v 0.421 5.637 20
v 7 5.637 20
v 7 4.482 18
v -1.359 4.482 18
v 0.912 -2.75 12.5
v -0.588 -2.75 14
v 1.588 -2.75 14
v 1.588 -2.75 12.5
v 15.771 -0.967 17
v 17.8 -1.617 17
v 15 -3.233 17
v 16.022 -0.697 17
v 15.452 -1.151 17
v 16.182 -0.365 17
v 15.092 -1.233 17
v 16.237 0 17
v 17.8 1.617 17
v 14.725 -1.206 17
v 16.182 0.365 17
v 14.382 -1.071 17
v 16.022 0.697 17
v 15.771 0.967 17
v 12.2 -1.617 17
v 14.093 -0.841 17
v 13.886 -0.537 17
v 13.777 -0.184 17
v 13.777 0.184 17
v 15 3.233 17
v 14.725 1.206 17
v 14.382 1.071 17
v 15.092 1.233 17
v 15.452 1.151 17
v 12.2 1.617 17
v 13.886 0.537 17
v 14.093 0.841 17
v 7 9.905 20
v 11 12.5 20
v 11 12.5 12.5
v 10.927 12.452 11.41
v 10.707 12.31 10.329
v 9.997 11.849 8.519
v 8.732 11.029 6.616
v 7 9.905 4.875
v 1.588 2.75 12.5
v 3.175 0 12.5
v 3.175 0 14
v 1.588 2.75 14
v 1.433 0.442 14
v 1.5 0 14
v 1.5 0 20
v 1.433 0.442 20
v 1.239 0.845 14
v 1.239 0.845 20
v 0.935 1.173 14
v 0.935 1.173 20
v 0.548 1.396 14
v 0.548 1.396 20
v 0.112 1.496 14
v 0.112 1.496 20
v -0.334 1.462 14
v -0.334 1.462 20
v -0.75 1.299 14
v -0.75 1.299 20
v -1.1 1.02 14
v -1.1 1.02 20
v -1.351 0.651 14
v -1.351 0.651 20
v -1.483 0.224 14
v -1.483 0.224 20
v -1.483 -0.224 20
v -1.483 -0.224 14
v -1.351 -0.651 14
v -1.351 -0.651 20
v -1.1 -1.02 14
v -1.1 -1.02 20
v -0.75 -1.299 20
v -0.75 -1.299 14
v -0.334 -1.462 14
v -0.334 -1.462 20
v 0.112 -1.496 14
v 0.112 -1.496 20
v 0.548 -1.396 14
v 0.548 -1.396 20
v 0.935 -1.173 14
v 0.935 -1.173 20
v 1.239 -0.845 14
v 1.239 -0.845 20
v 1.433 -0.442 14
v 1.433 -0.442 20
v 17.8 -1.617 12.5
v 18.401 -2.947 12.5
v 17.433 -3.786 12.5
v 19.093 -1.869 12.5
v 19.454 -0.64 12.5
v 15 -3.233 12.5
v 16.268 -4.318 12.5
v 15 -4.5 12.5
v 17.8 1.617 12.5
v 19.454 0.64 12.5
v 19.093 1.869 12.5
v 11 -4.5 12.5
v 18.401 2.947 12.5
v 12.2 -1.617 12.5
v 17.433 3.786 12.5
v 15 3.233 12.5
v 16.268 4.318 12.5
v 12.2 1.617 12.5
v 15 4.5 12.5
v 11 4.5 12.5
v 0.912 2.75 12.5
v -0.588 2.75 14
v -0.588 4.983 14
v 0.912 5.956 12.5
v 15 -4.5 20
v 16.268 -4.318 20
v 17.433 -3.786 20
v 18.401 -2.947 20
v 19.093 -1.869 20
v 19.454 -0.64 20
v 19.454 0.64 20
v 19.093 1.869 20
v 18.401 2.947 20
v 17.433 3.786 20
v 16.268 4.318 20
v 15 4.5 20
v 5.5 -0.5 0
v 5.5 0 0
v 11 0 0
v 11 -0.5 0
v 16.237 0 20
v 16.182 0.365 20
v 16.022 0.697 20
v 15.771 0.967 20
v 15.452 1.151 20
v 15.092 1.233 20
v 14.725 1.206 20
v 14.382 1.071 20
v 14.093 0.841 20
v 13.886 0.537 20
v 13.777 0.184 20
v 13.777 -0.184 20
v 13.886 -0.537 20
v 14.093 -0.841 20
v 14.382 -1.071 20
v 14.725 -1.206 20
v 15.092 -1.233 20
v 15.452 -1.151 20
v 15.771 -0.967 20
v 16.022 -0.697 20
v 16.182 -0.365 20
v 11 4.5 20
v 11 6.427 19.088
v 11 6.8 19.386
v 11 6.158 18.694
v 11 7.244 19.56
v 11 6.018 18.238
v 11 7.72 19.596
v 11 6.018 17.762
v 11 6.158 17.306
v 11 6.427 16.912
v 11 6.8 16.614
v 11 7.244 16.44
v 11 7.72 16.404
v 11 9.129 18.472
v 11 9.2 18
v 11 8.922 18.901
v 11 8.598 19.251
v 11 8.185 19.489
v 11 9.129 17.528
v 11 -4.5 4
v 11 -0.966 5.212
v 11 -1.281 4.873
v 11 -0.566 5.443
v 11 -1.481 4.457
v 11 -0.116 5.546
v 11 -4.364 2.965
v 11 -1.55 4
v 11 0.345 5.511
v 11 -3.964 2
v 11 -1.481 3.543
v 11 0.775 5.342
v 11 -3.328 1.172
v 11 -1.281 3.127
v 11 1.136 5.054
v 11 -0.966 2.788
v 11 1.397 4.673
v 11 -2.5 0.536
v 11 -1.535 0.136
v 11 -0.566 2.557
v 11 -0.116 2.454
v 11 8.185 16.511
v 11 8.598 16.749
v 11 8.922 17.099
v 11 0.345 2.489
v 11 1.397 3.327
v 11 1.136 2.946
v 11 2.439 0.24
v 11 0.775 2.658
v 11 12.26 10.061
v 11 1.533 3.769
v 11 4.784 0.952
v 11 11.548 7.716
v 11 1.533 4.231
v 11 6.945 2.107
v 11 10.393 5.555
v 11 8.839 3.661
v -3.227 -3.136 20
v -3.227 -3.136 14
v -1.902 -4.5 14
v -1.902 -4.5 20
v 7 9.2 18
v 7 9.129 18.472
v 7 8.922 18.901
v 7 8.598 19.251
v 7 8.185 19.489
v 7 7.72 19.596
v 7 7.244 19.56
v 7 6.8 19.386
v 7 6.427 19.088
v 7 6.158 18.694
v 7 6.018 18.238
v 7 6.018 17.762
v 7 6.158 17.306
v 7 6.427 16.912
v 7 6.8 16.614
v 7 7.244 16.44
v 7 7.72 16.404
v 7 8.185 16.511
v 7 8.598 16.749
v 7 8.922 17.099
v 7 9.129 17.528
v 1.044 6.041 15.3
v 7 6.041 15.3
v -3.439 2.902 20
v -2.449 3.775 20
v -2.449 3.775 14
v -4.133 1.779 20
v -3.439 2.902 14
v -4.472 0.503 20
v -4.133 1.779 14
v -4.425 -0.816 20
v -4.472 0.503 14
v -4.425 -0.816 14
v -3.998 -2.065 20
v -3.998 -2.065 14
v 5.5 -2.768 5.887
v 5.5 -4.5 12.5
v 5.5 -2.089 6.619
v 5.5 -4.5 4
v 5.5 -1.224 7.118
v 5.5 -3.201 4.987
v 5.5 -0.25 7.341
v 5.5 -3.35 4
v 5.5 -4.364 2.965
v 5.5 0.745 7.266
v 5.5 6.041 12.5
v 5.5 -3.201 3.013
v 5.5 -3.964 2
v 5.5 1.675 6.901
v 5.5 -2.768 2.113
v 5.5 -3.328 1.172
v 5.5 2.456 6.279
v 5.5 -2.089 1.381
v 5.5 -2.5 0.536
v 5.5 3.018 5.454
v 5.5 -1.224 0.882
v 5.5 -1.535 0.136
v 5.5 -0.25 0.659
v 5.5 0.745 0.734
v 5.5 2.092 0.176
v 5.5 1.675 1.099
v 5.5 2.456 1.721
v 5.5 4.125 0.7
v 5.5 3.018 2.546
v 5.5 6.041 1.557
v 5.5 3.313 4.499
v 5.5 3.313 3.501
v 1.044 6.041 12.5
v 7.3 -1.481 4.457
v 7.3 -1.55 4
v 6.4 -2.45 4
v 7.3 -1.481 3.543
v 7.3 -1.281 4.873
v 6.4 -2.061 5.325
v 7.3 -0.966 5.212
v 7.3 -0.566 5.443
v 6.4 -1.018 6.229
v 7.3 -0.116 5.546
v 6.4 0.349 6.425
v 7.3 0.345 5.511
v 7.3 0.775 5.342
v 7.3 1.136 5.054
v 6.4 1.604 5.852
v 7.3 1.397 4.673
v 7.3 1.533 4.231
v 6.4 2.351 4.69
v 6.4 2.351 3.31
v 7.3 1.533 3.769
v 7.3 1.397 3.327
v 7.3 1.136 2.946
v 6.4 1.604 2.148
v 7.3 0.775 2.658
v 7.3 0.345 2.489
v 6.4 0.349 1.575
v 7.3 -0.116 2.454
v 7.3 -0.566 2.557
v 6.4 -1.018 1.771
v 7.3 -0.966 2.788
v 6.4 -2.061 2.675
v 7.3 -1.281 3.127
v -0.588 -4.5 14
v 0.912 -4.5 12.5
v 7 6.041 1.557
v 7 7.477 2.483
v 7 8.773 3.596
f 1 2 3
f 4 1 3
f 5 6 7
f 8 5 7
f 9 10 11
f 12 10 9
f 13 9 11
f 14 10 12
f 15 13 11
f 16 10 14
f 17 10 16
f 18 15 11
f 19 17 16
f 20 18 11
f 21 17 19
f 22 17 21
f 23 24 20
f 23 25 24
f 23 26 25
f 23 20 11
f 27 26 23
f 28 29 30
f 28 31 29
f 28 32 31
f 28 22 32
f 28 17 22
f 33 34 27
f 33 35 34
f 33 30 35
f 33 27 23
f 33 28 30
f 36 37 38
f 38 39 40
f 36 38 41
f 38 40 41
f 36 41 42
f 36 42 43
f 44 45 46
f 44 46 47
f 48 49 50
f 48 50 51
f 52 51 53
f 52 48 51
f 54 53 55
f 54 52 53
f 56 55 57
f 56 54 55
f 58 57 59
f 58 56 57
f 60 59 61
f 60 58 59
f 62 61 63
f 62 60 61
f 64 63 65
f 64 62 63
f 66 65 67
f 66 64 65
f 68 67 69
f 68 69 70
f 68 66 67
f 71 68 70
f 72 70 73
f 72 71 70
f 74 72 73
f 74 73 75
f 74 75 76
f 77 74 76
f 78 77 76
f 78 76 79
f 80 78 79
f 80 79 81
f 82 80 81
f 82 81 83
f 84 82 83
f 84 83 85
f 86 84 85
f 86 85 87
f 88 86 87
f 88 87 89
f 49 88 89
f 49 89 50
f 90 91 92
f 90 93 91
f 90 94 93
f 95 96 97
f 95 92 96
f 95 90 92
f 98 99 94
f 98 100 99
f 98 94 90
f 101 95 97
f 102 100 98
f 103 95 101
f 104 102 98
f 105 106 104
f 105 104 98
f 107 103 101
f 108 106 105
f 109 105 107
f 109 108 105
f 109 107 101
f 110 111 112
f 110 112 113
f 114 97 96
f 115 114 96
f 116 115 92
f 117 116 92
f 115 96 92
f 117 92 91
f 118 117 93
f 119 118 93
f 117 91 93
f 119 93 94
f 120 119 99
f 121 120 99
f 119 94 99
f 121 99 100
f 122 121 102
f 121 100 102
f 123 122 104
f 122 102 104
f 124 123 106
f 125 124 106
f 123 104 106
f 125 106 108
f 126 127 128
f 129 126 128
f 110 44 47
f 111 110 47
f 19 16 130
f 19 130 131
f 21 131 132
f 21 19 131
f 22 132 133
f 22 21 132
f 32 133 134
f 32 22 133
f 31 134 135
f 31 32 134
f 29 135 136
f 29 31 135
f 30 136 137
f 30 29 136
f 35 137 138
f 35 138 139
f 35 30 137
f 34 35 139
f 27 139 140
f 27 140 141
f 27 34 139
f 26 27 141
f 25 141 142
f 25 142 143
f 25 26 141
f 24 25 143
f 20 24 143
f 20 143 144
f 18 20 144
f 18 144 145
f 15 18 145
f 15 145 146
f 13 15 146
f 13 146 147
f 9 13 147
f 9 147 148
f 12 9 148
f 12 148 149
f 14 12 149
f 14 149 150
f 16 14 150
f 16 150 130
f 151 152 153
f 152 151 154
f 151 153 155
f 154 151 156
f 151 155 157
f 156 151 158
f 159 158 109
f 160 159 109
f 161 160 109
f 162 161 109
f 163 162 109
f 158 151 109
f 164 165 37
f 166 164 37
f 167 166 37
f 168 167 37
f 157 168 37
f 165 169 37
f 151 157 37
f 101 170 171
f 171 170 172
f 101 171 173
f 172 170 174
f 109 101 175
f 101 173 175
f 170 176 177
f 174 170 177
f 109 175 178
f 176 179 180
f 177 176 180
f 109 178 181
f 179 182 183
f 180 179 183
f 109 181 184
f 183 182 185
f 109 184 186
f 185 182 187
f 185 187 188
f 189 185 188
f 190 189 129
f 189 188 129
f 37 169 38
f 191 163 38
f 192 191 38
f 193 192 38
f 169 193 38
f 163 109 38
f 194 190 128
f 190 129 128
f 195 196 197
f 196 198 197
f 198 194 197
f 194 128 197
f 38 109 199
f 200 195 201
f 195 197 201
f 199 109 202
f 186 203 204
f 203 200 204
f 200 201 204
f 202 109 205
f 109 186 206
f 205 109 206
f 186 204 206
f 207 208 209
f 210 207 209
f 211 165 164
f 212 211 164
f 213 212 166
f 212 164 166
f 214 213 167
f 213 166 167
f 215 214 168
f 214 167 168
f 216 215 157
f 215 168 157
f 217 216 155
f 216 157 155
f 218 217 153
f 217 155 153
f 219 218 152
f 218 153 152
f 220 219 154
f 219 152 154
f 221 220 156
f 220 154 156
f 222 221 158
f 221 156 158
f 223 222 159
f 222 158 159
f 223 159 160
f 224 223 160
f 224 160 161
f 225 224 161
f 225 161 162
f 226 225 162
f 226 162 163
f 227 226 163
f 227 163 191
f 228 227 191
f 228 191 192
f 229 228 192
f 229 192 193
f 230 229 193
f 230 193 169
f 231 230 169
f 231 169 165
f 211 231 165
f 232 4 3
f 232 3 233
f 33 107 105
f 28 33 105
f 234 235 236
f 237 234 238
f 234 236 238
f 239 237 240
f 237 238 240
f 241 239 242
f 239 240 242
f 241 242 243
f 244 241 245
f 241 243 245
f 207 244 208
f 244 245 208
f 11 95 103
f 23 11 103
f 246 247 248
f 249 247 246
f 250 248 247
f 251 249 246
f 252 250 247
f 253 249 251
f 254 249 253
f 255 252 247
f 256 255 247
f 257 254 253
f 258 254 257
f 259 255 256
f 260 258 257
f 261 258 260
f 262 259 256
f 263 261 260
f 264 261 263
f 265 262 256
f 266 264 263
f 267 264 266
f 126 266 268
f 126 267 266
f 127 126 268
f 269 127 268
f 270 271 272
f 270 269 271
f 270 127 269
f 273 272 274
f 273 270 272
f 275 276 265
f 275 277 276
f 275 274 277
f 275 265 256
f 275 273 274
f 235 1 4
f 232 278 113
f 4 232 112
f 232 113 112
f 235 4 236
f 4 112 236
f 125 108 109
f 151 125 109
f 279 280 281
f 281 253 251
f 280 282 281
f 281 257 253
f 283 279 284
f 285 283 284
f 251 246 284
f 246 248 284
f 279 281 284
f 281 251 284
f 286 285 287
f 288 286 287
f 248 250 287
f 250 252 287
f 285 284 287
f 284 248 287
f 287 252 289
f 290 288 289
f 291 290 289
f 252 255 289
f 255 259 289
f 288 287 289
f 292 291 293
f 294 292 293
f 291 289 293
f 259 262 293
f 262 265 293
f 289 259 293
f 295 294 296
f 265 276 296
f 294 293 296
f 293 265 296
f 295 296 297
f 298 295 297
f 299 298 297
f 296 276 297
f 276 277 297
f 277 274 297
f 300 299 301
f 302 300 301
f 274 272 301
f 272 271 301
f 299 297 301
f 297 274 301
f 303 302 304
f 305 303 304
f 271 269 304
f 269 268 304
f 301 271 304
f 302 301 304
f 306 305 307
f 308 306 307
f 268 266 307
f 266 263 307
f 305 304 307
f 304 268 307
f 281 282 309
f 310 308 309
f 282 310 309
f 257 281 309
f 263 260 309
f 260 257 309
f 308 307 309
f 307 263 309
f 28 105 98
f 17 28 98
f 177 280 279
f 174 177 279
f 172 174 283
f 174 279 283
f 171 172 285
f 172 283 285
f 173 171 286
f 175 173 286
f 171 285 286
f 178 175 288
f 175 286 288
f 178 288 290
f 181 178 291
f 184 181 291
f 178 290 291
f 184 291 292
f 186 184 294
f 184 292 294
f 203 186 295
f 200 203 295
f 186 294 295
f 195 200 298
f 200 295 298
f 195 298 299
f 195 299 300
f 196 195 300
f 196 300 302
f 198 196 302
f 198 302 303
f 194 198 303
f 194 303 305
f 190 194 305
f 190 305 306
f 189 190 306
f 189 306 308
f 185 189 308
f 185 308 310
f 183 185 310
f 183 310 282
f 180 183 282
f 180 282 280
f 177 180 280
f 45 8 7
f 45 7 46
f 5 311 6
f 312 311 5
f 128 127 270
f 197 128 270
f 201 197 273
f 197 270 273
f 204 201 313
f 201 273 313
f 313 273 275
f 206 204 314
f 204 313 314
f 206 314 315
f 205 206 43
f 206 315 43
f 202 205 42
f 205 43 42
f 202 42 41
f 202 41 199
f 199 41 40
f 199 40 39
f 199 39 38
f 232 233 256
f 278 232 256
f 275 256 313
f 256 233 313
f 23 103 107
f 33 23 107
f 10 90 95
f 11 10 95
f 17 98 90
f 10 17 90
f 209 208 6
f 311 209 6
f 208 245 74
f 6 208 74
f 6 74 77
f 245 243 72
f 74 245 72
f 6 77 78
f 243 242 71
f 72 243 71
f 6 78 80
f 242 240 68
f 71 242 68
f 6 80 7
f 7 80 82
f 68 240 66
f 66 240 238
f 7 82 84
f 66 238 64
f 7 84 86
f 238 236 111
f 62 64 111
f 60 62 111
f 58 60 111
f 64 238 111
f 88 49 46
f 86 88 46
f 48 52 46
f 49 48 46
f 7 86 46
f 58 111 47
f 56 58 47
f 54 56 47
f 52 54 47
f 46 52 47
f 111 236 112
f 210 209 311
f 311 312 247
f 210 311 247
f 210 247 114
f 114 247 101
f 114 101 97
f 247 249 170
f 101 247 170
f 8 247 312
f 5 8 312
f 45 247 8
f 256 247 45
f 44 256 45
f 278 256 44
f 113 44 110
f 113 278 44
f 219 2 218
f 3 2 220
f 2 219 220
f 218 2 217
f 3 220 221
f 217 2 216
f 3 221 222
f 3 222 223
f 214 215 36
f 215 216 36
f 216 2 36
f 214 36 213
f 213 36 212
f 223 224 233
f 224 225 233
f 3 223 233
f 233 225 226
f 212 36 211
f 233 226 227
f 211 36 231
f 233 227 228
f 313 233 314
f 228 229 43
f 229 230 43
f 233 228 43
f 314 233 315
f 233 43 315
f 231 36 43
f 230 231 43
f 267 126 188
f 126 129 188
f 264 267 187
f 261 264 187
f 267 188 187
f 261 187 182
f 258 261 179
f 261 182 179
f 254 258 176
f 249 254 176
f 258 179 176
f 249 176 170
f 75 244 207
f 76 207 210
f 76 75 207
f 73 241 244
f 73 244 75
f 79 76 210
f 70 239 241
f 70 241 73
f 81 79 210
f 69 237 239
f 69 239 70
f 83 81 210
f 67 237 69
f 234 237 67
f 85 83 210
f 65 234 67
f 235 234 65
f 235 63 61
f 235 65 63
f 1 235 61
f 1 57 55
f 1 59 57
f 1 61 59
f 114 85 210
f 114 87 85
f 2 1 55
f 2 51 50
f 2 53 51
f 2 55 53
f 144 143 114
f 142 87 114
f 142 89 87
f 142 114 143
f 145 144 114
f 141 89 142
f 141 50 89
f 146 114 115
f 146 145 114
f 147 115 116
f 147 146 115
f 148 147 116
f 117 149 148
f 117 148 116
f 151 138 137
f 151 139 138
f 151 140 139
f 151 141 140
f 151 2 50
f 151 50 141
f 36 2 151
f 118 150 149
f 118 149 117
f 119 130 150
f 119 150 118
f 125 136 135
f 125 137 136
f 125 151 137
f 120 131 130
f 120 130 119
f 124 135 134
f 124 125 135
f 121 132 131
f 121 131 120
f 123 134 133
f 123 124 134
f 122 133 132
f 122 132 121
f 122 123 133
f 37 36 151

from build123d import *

# Parameters (mm, degrees)
SKETCH1_R           = 1.5
SKETCH1_R_2         = 1.236773622
BOSS_EXTRUDE1_DEPTH = 20
SKETCH3_R           = 1.6
CUT_EXTRUDE3_DEPTH  = 29.222331583
CUT_EXTRUDE4_DEPTH  = 14
CUT_EXTRUDE5_START  = -4
CUT_EXTRUDE5_DEPTH  = 25.222331583
SKETCH6_W           = 8.5
SKETCH6_H           = 9
SKETCH6_W_2         = 10
SKETCH6_H_2         = 10.541154273
CUT_EXTRUDE6_DEPTH  = 12.5
CHAMFER2_SIZE       = 2.5
CUT_EXTRUDE7_DEPTH  = 4.5
SKETCH8_R           = 1.55
CUT_EXTRUDE8_DEPTH  = 28.427176304
FILLET1_R           = 4
CHAMFER4_SIZE       = 1.8


with BuildPart() as part:
    # Sketch1 → Boss-Extrude1 (new body)
    with BuildSketch(Plane.XY):
        with BuildLine():
            Line((11, 12.5), (-2.4490752, 3.775186176))
            ThreePointArc((-2.4490752, 3.775186176), (-4.471750095, 0.503439255), (-3.227167472, -3.136142553))
            Line((-3.227167472, -3.136142553), (-1.901778748, -4.5))
            Line((-1.901778748, -4.5), (15, -4.5))
            ThreePointArc((15, -4.5), (19.5, 0), (15, 4.5))
            Line((15, 4.5), (11, 4.5))
            Line((11, 4.5), (11, 12.5))
        make_face()
        Circle(SKETCH1_R, mode=Mode.SUBTRACT)
        with Locations((15, 0)):
            Circle(SKETCH1_R_2, mode=Mode.SUBTRACT)
    extrude(amount=BOSS_EXTRUDE1_DEPTH)

    # Sketch3 → Cut-Extrude3 (cut, through all)
    with BuildSketch(Plane(origin=(11, 0, 0), x_dir=(0, 0, -1), z_dir=(1, 0, 0))):
        with Locations(Location((-18, 7.6, 0), (0, 0, 90))):
            Circle(SKETCH3_R)
    extrude(amount=-CUT_EXTRUDE3_DEPTH, mode=Mode.SUBTRACT)

    # Sketch4 → Cut-Extrude4 (cut)
    with BuildSketch(Plane(origin=(0, 0, 0), x_dir=(-1, 0, 0), z_dir=(0, 0, -1))):
        Polygon((1.58771324, 2.75), (1.58771324, 5.862379977), (6.597571209, 5.862379977), (6.597571209, -6.099785374), (1.58771324, -6.099785374), (1.58771324, -2.75), (-1.58771324, -2.75), (-3.175426481, 0), (-1.58771324, 2.75), align=None)
    extrude(amount=-CUT_EXTRUDE4_DEPTH, mode=Mode.SUBTRACT)

    # Sketch5 → Cut-Extrude5 (cut, through all)
    with BuildSketch(Plane(origin=(11, 0, 0), x_dir=(0, 0, -1), z_dir=(1, 0, 0)).offset(CUT_EXTRUDE5_START)):
        Polygon((-15.3, 6.041154273), (0, 6.041154273), (0, 11.349742261), (-20, 11.872391992), (-20, 5.637009085), (-18, 4.482308546), align=None)
    extrude(amount=-CUT_EXTRUDE5_DEPTH, mode=Mode.SUBTRACT)

    # Sketch6 → Cut-Extrude6 (cut)
    with BuildSketch(Plane(origin=(0, 0, 0), x_dir=(-1, 0, 0), z_dir=(0, 0, -1))):
        with Locations((-15.25, 0)):
            Rectangle(SKETCH6_W, SKETCH6_H)
        with Locations((-0.5, 0.770577137)):
            Rectangle(SKETCH6_W_2, SKETCH6_H_2)
    extrude(amount=-CUT_EXTRUDE6_DEPTH, mode=Mode.SUBTRACT)

    # Chamfer2
    # the kernel refuses this chamfer: 2.5 mm, written as the material it takes off along each edge
    with BuildSketch(Plane(origin=(-1.58771324, -10.92920747, 12.5), x_dir=(-0.027495876610586403, 0, 0.9996219169112968), z_dir=(0, 1, 0))) as chamfer2_piece_1_section:
        Polygon((CHAMFER2_SIZE * 0.999621916911, CHAMFER2_SIZE * 0.0274958766106), (-CHAMFER2_SIZE * 0.0274958766106, CHAMFER2_SIZE * 0.999621916911), (0, 0), align=None)
    chamfer2_piece_1 = extrude(amount=14.60841494, mode=Mode.PRIVATE)
    chamfer2_piece_1 = split(chamfer2_piece_1, bisect_by=Plane(origin=(-0.650189591, -3.625, 14), z_dir=(0, 0, -1)), keep=Keep.TOP, mode=Mode.PRIVATE)
    add(chamfer2_piece_1, mode=Mode.SUBTRACT)
    with BuildSketch(Plane(origin=(-1.58771324, -3.67920747, 12.5), x_dir=(-0.027495876610586403, 0, 0.9996219169112968), z_dir=(0, 1, 0))) as chamfer2_piece_2_section:
        Polygon((CHAMFER2_SIZE * 0.999621916911, CHAMFER2_SIZE * 0.0274958766106), (-CHAMFER2_SIZE * 0.0274958766106, CHAMFER2_SIZE * 0.999621916911), (0, 0), align=None)
    chamfer2_piece_2 = extrude(amount=14.442392157, mode=Mode.PRIVATE)
    chamfer2_piece_2 = split(chamfer2_piece_2, bisect_by=Plane(origin=(-0.650189591, 3.541988609, 14), z_dir=(0, 0, -1)), keep=Keep.TOP, mode=Mode.PRIVATE)
    add(chamfer2_piece_2, mode=Mode.SUBTRACT)

    # Sketch7 → Cut-Extrude7 (cut)
    with BuildSketch(Plane(origin=(0, 0, 12.5), x_dir=(-1, 0, 0), z_dir=(0, 0, -1))):
        Polygon((-12.2, -1.616580754), (-12.2, 1.616580754), (-15, 3.233161507), (-17.8, 1.616580754), (-17.8, -1.616580754), (-15, -3.233161507), align=None)
    extrude(amount=-CUT_EXTRUDE7_DEPTH, mode=Mode.SUBTRACT)

    # Sketch8 → Cut-Extrude8 (cut, through all)
    with BuildSketch(Plane.ZY.offset(-5.5)):
        with Locations(Location((4, 0, 0), (0, 0, 270))):
            Circle(SKETCH8_R)
        with BuildLine():
            Line((12.5, 12.5), (0, 12.5))
            Line((0, 12.5), (0, 0))
            ThreePointArc((0, 0), (3.661165235, 8.838834765), (12.5, 12.5))
        make_face()
    extrude(amount=-CUT_EXTRUDE8_DEPTH, mode=Mode.SUBTRACT)

    # Fillet1
    fillet1_edges = [part.edges().sort_by_distance(p)[0] for p in [
        (8.25, -4.5, 0),
    ]]
    fillet(fillet1_edges, radius=FILLET1_R)

    # Chamfer4
    chamfer4_edges = [part.edges().sort_by_distance(p)[0] for p in [
        (5.5, 1.55, 4),
    ]]
    chamfer(chamfer4_edges, length=CHAMFER4_SIZE)


solid = part.part
